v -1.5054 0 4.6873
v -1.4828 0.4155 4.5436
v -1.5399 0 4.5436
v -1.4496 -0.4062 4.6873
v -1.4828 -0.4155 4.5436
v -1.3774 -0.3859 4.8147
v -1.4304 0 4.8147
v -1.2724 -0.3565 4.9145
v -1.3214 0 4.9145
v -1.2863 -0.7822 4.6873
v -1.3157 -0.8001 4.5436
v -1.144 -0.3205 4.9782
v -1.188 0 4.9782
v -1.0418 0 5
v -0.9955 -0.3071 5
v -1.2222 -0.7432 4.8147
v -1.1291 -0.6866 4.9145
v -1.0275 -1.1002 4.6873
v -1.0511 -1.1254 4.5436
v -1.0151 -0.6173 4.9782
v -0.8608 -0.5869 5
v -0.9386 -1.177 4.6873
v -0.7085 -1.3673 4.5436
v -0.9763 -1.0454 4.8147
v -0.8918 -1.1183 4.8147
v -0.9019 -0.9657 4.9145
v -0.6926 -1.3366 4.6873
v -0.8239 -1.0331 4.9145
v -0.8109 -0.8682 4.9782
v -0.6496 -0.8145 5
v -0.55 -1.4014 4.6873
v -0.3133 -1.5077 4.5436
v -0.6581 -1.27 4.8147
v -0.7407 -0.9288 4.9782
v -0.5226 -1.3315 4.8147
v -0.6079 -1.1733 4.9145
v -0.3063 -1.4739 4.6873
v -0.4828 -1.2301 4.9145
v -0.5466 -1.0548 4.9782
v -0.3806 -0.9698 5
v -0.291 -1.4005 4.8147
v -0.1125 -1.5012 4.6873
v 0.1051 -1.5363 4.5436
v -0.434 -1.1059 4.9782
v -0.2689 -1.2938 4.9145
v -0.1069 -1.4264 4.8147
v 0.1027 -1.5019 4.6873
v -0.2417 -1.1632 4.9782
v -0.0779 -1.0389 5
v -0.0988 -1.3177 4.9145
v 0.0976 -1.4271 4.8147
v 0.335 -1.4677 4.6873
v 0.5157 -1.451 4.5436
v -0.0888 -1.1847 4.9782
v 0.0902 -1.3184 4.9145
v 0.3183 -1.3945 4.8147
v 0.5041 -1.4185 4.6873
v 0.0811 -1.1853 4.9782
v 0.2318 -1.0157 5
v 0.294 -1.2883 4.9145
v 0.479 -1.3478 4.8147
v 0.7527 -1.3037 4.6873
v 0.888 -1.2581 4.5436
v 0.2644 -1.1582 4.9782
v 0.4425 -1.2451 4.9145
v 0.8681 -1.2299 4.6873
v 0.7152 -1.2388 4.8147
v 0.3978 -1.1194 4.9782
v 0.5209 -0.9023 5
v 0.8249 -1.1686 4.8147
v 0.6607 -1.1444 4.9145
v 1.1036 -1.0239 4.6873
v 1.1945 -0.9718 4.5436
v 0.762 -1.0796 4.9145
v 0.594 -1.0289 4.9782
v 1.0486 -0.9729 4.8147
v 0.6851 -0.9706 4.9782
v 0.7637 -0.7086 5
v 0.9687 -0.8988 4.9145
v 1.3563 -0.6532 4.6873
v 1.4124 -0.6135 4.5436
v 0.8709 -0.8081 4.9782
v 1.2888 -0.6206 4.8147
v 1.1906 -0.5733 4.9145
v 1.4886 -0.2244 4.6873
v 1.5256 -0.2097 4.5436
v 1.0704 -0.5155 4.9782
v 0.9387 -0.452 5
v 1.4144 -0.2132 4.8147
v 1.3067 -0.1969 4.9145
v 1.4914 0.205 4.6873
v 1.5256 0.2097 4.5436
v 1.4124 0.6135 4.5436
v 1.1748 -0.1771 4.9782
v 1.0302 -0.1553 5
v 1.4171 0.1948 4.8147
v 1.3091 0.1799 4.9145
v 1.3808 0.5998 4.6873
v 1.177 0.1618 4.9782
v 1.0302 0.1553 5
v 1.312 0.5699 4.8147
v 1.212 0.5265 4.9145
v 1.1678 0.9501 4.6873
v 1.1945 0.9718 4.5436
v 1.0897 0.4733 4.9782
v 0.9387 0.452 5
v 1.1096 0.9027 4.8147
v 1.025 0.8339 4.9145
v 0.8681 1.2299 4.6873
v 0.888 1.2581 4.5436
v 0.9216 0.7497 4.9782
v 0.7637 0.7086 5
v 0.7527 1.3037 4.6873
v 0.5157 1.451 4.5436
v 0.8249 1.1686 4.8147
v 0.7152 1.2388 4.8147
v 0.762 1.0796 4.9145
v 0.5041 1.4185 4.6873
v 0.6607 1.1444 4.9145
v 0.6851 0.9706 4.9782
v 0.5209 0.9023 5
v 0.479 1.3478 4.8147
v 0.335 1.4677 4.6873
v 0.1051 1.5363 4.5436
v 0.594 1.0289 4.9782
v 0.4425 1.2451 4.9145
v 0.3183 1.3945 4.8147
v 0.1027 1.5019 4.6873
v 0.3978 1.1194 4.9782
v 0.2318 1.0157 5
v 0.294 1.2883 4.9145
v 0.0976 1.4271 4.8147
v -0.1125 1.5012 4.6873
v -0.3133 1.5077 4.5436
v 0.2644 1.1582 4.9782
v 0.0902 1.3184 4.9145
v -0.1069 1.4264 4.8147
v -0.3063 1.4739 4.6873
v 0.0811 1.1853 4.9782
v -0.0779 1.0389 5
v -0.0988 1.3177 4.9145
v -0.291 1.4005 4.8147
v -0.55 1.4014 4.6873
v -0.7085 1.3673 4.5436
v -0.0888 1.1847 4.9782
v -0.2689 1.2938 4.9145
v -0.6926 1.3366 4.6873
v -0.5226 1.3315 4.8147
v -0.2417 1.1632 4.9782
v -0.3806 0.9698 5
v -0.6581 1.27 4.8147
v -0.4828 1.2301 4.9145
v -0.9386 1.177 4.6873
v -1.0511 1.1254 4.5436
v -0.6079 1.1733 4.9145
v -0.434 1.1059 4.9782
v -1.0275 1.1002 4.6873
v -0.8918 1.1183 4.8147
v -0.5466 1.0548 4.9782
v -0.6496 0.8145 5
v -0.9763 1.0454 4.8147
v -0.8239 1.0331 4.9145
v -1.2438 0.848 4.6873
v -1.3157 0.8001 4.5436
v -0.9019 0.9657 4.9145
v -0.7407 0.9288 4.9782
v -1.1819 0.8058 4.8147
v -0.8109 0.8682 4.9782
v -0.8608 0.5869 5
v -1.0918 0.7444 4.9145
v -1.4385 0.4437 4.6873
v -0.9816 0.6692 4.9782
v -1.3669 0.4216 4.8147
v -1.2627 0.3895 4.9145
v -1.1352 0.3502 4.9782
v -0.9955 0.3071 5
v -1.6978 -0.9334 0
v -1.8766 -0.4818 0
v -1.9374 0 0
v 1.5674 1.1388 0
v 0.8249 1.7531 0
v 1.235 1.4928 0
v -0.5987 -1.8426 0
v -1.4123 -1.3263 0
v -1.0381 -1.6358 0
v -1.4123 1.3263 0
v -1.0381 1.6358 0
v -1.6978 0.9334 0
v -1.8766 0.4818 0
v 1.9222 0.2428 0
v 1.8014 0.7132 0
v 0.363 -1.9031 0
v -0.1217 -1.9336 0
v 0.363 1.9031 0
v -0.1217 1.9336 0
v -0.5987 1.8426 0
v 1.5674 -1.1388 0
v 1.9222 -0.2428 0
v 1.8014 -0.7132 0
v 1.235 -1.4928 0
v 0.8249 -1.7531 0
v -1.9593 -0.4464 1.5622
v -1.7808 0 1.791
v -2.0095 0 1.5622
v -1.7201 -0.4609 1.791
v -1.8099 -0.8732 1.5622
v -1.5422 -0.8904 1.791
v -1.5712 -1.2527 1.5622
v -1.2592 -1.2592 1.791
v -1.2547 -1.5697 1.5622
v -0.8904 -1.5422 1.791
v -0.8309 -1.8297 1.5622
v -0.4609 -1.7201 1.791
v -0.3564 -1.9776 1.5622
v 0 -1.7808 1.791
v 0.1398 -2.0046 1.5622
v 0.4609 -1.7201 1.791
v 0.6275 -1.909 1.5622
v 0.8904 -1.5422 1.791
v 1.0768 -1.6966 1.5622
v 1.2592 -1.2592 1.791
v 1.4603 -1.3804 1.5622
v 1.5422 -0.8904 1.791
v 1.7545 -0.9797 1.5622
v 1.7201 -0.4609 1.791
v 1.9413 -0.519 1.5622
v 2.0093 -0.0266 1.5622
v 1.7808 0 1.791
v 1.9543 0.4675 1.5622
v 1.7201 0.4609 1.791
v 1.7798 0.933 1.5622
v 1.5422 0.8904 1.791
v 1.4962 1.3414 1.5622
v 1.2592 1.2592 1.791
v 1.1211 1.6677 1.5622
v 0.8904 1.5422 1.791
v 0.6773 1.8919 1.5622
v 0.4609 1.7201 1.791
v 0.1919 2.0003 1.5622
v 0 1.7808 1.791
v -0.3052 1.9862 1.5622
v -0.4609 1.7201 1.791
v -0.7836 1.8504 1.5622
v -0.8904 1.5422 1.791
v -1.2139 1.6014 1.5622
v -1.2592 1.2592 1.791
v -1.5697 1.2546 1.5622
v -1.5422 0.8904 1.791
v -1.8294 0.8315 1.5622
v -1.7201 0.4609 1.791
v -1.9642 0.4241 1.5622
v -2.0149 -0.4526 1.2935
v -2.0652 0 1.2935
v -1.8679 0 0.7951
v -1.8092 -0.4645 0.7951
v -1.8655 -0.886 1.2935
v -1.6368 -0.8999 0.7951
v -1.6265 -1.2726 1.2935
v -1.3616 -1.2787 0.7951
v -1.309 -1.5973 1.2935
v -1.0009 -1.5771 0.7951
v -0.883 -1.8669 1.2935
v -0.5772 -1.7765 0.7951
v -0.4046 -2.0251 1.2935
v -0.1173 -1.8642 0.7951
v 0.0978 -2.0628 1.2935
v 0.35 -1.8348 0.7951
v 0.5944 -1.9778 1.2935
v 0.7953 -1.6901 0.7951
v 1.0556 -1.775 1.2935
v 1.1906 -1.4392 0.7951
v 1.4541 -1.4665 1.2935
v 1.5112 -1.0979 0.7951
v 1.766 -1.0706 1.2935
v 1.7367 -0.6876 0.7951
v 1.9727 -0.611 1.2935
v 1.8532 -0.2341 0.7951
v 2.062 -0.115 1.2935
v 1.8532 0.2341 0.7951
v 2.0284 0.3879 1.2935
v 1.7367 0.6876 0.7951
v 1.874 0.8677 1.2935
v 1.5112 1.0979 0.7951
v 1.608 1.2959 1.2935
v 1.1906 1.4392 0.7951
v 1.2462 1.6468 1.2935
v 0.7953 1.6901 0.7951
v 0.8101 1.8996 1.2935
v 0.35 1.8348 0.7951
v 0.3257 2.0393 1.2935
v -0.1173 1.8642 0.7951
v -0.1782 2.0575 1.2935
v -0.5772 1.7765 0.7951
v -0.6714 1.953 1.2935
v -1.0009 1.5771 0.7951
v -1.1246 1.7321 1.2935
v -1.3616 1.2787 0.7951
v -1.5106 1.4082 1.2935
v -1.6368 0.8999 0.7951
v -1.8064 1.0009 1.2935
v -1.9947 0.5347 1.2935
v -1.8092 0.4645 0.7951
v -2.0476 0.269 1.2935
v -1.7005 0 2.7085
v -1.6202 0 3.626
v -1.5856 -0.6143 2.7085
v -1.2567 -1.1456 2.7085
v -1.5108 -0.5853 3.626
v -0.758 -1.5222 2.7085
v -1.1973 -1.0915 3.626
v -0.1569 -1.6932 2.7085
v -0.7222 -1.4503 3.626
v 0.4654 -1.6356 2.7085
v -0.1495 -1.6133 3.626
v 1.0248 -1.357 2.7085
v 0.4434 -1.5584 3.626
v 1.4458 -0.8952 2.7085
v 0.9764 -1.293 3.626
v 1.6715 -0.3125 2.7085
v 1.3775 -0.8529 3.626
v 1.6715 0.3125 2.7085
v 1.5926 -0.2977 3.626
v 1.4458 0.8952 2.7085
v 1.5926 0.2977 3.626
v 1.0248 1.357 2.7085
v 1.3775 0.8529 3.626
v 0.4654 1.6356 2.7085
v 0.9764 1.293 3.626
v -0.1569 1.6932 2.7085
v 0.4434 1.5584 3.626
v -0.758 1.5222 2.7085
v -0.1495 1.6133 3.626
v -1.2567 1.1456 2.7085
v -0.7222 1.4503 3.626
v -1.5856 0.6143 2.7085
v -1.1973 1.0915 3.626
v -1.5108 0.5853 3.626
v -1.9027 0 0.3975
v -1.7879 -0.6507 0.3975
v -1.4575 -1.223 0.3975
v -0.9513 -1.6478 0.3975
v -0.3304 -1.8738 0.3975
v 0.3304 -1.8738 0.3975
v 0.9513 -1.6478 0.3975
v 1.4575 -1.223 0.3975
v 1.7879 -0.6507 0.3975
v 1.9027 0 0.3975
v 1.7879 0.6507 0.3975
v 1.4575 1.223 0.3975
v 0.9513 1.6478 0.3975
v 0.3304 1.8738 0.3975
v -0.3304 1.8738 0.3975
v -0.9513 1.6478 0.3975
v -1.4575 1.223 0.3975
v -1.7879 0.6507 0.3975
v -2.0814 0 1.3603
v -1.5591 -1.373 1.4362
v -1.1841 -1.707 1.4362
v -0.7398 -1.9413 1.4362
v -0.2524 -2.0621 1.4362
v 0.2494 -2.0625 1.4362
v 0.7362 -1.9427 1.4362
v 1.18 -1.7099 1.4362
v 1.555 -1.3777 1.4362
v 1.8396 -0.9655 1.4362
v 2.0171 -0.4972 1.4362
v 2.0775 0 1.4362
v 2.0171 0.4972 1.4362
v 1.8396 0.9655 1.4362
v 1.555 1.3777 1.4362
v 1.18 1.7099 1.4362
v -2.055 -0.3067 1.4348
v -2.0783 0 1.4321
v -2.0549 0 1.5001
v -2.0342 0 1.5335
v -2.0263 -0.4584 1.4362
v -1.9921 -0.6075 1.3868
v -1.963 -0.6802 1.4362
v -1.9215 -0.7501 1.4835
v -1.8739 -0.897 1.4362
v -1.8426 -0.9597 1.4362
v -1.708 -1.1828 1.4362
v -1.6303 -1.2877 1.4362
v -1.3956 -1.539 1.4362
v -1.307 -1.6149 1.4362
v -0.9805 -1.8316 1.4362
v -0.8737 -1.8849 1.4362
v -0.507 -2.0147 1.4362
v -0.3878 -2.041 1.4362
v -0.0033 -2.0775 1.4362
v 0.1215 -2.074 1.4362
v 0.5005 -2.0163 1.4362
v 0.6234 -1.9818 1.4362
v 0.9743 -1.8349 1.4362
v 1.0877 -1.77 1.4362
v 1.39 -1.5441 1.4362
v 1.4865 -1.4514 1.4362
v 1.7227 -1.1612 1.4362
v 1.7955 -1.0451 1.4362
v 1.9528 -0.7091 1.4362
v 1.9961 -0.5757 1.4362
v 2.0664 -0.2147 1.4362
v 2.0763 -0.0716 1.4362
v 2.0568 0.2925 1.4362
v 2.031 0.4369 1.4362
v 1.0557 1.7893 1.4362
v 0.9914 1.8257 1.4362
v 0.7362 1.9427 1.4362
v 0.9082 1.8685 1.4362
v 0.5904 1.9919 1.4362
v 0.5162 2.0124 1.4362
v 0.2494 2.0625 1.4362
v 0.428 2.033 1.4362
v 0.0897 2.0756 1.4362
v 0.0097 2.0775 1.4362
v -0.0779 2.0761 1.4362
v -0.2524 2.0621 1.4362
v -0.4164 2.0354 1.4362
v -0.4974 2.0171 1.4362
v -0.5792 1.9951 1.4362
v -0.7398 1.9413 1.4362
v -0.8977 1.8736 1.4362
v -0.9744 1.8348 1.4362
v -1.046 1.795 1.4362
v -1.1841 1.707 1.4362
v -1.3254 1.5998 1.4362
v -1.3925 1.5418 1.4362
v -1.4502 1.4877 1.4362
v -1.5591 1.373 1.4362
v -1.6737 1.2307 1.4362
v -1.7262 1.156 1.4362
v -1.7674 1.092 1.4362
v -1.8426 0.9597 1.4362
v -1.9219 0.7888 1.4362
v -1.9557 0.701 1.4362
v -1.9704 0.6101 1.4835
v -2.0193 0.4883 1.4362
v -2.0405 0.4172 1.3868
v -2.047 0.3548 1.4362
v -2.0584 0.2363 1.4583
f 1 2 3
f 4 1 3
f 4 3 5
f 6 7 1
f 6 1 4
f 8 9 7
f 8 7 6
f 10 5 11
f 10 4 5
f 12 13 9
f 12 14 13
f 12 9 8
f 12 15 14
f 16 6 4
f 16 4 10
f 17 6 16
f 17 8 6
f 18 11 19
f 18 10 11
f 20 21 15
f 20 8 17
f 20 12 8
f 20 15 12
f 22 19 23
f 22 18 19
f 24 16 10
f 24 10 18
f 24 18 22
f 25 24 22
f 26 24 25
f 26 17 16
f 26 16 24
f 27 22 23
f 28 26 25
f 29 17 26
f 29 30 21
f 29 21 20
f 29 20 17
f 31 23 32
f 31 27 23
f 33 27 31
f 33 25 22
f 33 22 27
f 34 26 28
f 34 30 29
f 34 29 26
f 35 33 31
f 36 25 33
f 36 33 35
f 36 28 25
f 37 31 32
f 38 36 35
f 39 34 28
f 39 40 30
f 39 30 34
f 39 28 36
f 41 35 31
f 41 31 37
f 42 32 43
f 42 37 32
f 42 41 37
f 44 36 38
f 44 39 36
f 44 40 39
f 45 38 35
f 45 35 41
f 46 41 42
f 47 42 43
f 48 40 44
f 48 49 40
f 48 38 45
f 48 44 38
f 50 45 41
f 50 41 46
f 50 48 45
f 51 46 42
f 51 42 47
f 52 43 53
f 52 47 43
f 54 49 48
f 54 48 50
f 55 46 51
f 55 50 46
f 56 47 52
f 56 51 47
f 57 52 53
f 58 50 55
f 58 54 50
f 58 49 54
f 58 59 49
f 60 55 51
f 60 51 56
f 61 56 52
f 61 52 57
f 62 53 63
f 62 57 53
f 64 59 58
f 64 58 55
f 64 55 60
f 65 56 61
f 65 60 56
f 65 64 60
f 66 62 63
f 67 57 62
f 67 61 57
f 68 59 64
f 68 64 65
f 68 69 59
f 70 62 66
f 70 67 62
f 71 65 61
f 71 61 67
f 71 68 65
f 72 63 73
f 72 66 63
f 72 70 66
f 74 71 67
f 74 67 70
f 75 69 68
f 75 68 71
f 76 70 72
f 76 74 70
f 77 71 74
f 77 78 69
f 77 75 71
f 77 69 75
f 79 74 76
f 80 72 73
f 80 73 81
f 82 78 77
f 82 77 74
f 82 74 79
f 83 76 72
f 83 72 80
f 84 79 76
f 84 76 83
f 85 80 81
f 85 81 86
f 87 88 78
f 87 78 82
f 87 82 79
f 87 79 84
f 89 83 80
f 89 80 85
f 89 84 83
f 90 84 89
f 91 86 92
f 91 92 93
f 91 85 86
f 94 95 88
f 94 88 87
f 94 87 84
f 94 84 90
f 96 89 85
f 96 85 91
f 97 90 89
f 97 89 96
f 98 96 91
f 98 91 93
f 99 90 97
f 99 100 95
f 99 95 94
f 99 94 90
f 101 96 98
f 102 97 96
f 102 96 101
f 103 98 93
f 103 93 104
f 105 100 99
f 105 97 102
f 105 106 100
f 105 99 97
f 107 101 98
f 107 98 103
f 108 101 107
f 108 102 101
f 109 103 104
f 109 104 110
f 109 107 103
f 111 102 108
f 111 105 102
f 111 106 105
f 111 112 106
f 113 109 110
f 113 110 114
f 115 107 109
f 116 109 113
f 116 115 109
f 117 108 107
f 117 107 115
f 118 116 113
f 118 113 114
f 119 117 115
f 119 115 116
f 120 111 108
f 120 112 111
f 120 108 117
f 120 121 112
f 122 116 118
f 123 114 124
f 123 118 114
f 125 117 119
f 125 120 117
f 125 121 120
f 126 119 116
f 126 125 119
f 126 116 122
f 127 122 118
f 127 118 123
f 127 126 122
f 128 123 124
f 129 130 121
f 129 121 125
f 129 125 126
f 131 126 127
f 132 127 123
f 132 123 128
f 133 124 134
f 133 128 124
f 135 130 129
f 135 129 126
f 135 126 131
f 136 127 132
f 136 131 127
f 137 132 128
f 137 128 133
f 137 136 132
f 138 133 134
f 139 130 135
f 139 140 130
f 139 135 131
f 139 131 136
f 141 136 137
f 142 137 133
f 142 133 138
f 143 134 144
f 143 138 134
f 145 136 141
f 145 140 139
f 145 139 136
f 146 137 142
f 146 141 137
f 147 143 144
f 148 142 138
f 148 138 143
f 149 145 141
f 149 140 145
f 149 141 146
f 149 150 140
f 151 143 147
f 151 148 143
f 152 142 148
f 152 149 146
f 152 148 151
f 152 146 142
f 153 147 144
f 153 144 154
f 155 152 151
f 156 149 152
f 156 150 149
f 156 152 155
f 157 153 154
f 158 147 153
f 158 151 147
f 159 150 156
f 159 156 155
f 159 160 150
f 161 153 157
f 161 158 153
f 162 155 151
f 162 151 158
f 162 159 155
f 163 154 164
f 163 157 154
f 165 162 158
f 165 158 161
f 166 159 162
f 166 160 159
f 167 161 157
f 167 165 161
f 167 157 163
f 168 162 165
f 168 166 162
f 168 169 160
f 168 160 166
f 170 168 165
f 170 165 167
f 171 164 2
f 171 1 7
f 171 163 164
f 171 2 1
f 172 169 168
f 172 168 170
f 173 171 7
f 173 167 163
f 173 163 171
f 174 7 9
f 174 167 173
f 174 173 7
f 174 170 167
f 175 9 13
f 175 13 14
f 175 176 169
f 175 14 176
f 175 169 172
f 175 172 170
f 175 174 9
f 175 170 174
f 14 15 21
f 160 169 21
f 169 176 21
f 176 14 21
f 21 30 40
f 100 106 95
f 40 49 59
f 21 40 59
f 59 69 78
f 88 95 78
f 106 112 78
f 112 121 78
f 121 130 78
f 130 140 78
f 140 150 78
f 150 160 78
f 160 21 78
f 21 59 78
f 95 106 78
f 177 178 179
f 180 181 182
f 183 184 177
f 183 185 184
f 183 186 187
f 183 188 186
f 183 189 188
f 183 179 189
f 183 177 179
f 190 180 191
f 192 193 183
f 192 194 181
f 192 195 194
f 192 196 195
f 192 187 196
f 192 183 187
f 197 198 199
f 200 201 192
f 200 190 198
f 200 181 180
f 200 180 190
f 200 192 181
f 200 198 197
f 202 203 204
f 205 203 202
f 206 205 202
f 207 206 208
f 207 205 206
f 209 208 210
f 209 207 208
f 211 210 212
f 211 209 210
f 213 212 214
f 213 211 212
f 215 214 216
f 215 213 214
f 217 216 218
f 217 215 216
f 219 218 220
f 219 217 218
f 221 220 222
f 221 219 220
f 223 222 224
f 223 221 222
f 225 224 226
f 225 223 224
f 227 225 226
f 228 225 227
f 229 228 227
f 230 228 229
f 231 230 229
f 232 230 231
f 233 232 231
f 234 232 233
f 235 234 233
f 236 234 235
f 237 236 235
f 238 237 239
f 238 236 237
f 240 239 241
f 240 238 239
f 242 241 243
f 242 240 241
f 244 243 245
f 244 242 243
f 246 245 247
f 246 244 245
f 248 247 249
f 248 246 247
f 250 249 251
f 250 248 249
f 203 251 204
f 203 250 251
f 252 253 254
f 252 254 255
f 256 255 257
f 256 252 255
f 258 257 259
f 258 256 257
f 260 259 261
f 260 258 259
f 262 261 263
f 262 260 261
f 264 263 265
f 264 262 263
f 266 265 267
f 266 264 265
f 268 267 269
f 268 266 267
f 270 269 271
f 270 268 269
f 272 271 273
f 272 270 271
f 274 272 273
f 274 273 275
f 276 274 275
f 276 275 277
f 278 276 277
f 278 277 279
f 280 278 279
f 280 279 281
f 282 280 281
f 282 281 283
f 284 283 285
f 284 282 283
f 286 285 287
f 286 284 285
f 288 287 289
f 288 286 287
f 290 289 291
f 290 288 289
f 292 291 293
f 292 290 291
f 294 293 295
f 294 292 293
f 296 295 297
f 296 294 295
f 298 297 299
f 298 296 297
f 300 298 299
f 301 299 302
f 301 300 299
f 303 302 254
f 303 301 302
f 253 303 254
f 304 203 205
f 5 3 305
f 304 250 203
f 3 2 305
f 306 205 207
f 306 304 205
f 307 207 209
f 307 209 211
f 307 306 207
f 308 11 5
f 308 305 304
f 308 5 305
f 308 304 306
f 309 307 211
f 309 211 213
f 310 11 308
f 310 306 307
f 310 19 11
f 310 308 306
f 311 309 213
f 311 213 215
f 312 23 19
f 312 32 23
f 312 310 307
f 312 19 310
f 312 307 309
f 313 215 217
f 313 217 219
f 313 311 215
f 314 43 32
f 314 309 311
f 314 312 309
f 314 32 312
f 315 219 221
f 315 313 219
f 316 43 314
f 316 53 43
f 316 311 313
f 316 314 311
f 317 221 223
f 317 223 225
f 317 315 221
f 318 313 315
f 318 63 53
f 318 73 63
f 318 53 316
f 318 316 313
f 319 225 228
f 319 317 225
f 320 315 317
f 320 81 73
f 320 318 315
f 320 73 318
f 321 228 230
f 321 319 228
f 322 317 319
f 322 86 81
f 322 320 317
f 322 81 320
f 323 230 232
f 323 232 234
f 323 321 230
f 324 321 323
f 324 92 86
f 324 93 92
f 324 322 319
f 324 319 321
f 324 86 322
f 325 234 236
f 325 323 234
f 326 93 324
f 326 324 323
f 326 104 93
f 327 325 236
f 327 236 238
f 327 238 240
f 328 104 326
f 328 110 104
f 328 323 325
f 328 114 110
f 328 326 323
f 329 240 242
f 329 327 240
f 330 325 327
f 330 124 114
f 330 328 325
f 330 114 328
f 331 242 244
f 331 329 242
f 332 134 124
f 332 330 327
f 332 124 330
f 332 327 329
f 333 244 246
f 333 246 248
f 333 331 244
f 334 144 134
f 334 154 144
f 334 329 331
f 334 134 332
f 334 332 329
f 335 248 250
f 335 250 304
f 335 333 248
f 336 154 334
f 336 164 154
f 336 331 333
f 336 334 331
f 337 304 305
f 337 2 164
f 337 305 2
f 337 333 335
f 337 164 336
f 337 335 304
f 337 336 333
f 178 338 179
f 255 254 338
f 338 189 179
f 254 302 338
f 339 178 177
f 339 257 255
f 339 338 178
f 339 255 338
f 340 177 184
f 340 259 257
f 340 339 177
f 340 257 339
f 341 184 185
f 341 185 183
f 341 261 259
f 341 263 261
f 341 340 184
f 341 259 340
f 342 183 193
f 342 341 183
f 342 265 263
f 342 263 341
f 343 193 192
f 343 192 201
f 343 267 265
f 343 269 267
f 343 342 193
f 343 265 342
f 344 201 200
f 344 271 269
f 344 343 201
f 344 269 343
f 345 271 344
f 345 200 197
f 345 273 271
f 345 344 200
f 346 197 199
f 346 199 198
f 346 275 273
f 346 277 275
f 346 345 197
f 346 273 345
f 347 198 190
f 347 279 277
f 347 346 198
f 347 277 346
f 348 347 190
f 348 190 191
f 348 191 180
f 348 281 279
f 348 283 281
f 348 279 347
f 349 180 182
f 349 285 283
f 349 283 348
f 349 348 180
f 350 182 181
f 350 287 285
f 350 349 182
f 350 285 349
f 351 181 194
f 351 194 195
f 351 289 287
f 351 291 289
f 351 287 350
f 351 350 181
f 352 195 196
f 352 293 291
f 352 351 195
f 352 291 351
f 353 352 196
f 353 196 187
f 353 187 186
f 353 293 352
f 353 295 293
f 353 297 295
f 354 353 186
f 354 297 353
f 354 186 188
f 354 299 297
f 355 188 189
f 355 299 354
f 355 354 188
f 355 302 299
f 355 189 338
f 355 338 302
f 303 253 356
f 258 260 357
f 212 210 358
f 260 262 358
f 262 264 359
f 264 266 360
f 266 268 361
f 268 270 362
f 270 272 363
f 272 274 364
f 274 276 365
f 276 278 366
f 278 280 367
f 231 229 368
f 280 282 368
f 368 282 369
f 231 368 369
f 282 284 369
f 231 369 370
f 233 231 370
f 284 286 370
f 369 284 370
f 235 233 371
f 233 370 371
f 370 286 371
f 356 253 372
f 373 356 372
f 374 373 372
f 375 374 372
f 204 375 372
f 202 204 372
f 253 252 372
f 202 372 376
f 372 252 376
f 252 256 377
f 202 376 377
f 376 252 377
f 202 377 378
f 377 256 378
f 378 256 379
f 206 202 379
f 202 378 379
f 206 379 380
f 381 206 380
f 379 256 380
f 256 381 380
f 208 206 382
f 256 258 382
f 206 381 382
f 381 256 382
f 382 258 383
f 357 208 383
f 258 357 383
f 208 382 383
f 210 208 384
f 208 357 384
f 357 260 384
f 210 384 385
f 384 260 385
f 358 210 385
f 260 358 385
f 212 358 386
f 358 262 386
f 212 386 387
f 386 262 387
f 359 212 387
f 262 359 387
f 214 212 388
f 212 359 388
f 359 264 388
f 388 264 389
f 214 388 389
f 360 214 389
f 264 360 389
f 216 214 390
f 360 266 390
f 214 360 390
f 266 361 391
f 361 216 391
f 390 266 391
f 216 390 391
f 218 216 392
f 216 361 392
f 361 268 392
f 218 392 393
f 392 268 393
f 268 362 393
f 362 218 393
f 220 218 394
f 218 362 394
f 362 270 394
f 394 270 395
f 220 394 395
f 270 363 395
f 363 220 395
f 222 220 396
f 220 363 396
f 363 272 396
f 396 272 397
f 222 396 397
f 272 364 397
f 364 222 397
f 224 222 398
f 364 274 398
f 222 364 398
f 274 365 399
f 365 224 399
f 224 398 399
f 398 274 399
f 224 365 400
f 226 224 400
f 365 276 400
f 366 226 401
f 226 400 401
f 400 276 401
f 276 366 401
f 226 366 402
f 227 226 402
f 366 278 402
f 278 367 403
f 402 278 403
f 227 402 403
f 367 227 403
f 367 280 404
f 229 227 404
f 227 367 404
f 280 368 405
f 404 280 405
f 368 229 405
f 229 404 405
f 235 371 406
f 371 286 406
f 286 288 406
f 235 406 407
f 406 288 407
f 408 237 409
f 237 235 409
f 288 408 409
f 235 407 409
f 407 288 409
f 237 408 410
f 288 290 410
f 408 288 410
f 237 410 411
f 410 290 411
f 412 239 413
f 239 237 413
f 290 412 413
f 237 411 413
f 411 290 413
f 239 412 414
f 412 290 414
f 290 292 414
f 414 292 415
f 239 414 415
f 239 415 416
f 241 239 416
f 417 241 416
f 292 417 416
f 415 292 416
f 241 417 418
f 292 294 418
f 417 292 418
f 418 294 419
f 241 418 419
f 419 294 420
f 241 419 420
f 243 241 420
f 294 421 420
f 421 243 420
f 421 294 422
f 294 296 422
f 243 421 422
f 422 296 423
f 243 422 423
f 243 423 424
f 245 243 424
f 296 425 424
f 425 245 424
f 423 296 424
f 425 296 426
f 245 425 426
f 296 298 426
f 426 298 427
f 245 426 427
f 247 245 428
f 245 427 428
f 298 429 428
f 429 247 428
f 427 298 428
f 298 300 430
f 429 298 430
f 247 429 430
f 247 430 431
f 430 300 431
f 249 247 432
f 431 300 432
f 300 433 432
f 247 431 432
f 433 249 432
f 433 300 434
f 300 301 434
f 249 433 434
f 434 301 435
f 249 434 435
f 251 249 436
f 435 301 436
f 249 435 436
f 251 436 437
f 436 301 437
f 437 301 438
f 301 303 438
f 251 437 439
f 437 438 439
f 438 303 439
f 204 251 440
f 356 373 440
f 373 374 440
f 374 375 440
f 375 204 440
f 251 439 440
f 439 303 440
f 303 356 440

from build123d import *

# Parameters (mm, degrees)
SKETCH1_W       = 2
SKETCH1_H       = 5
CHAMFER1_SIZE   = 5.715026151
CHAMFER1_SIZE_2 = 0.5
FILLET1_R       = 0.5
FILLET2_R       = 0.25


with BuildPart() as part:
    # Sketch1 → Revolve1 (revolve)
    with BuildSketch(Plane.YZ, mode=Mode.PRIVATE) as revolve1_sk:
        with Locations((1, 2.5)):
            Rectangle(SKETCH1_W, SKETCH1_H)
    revolve(revolve1_sk.sketch.rotate(Axis((0, 0, 0), (0, 0, 1)), 90), axis=Axis((0, 0, 0), (0, 0, 1)))

    # Chamfer1
    # the kernel refuses this chamfer: 5.715026151, 0.5 mm, written as the material it takes off along each edge
    with BuildSketch(Plane(origin=(0, 0, 5), x_dir=(-1, 0, 0), z_dir=(0, 1, 0))) as chamfer1_piece_1:
        Polygon((2, -CHAMFER1_SIZE), (2 - CHAMFER1_SIZE_2, 0), (2, 0), align=None)
    revolve(axis=Axis((0, 0, 5), (0, 0, 1)), mode=Mode.SUBTRACT)

    # Fillet1
    fillet1_edges = [part.edges().sort_by_distance(p)[0] for p in [
        (1.5, 0, 5),
    ]]
    fillet(fillet1_edges, radius=FILLET1_R)

    # Sketch2 → Revolve3 (revolve)
    with BuildSketch(Plane.YZ, mode=Mode.PRIVATE) as revolve3_sk:
        Polygon((1.867885288, 0.795051912), (2.125603865, 1.446129176), (1.780752855, 1.790980186), align=None)
    revolve(revolve3_sk.sketch.rotate(Axis((0, 0, 0), (0, 0, 1)), 90), axis=Axis((0, 0, 0), (0, 0, 1)))

    # Fillet2
    fillet2_edges = [part.edges().sort_by_distance(p)[0] for p in [
        (2.125603865, 0, 1.446129176),
    ]]
    fillet(fillet2_edges, radius=FILLET2_R)


solid = part.part
